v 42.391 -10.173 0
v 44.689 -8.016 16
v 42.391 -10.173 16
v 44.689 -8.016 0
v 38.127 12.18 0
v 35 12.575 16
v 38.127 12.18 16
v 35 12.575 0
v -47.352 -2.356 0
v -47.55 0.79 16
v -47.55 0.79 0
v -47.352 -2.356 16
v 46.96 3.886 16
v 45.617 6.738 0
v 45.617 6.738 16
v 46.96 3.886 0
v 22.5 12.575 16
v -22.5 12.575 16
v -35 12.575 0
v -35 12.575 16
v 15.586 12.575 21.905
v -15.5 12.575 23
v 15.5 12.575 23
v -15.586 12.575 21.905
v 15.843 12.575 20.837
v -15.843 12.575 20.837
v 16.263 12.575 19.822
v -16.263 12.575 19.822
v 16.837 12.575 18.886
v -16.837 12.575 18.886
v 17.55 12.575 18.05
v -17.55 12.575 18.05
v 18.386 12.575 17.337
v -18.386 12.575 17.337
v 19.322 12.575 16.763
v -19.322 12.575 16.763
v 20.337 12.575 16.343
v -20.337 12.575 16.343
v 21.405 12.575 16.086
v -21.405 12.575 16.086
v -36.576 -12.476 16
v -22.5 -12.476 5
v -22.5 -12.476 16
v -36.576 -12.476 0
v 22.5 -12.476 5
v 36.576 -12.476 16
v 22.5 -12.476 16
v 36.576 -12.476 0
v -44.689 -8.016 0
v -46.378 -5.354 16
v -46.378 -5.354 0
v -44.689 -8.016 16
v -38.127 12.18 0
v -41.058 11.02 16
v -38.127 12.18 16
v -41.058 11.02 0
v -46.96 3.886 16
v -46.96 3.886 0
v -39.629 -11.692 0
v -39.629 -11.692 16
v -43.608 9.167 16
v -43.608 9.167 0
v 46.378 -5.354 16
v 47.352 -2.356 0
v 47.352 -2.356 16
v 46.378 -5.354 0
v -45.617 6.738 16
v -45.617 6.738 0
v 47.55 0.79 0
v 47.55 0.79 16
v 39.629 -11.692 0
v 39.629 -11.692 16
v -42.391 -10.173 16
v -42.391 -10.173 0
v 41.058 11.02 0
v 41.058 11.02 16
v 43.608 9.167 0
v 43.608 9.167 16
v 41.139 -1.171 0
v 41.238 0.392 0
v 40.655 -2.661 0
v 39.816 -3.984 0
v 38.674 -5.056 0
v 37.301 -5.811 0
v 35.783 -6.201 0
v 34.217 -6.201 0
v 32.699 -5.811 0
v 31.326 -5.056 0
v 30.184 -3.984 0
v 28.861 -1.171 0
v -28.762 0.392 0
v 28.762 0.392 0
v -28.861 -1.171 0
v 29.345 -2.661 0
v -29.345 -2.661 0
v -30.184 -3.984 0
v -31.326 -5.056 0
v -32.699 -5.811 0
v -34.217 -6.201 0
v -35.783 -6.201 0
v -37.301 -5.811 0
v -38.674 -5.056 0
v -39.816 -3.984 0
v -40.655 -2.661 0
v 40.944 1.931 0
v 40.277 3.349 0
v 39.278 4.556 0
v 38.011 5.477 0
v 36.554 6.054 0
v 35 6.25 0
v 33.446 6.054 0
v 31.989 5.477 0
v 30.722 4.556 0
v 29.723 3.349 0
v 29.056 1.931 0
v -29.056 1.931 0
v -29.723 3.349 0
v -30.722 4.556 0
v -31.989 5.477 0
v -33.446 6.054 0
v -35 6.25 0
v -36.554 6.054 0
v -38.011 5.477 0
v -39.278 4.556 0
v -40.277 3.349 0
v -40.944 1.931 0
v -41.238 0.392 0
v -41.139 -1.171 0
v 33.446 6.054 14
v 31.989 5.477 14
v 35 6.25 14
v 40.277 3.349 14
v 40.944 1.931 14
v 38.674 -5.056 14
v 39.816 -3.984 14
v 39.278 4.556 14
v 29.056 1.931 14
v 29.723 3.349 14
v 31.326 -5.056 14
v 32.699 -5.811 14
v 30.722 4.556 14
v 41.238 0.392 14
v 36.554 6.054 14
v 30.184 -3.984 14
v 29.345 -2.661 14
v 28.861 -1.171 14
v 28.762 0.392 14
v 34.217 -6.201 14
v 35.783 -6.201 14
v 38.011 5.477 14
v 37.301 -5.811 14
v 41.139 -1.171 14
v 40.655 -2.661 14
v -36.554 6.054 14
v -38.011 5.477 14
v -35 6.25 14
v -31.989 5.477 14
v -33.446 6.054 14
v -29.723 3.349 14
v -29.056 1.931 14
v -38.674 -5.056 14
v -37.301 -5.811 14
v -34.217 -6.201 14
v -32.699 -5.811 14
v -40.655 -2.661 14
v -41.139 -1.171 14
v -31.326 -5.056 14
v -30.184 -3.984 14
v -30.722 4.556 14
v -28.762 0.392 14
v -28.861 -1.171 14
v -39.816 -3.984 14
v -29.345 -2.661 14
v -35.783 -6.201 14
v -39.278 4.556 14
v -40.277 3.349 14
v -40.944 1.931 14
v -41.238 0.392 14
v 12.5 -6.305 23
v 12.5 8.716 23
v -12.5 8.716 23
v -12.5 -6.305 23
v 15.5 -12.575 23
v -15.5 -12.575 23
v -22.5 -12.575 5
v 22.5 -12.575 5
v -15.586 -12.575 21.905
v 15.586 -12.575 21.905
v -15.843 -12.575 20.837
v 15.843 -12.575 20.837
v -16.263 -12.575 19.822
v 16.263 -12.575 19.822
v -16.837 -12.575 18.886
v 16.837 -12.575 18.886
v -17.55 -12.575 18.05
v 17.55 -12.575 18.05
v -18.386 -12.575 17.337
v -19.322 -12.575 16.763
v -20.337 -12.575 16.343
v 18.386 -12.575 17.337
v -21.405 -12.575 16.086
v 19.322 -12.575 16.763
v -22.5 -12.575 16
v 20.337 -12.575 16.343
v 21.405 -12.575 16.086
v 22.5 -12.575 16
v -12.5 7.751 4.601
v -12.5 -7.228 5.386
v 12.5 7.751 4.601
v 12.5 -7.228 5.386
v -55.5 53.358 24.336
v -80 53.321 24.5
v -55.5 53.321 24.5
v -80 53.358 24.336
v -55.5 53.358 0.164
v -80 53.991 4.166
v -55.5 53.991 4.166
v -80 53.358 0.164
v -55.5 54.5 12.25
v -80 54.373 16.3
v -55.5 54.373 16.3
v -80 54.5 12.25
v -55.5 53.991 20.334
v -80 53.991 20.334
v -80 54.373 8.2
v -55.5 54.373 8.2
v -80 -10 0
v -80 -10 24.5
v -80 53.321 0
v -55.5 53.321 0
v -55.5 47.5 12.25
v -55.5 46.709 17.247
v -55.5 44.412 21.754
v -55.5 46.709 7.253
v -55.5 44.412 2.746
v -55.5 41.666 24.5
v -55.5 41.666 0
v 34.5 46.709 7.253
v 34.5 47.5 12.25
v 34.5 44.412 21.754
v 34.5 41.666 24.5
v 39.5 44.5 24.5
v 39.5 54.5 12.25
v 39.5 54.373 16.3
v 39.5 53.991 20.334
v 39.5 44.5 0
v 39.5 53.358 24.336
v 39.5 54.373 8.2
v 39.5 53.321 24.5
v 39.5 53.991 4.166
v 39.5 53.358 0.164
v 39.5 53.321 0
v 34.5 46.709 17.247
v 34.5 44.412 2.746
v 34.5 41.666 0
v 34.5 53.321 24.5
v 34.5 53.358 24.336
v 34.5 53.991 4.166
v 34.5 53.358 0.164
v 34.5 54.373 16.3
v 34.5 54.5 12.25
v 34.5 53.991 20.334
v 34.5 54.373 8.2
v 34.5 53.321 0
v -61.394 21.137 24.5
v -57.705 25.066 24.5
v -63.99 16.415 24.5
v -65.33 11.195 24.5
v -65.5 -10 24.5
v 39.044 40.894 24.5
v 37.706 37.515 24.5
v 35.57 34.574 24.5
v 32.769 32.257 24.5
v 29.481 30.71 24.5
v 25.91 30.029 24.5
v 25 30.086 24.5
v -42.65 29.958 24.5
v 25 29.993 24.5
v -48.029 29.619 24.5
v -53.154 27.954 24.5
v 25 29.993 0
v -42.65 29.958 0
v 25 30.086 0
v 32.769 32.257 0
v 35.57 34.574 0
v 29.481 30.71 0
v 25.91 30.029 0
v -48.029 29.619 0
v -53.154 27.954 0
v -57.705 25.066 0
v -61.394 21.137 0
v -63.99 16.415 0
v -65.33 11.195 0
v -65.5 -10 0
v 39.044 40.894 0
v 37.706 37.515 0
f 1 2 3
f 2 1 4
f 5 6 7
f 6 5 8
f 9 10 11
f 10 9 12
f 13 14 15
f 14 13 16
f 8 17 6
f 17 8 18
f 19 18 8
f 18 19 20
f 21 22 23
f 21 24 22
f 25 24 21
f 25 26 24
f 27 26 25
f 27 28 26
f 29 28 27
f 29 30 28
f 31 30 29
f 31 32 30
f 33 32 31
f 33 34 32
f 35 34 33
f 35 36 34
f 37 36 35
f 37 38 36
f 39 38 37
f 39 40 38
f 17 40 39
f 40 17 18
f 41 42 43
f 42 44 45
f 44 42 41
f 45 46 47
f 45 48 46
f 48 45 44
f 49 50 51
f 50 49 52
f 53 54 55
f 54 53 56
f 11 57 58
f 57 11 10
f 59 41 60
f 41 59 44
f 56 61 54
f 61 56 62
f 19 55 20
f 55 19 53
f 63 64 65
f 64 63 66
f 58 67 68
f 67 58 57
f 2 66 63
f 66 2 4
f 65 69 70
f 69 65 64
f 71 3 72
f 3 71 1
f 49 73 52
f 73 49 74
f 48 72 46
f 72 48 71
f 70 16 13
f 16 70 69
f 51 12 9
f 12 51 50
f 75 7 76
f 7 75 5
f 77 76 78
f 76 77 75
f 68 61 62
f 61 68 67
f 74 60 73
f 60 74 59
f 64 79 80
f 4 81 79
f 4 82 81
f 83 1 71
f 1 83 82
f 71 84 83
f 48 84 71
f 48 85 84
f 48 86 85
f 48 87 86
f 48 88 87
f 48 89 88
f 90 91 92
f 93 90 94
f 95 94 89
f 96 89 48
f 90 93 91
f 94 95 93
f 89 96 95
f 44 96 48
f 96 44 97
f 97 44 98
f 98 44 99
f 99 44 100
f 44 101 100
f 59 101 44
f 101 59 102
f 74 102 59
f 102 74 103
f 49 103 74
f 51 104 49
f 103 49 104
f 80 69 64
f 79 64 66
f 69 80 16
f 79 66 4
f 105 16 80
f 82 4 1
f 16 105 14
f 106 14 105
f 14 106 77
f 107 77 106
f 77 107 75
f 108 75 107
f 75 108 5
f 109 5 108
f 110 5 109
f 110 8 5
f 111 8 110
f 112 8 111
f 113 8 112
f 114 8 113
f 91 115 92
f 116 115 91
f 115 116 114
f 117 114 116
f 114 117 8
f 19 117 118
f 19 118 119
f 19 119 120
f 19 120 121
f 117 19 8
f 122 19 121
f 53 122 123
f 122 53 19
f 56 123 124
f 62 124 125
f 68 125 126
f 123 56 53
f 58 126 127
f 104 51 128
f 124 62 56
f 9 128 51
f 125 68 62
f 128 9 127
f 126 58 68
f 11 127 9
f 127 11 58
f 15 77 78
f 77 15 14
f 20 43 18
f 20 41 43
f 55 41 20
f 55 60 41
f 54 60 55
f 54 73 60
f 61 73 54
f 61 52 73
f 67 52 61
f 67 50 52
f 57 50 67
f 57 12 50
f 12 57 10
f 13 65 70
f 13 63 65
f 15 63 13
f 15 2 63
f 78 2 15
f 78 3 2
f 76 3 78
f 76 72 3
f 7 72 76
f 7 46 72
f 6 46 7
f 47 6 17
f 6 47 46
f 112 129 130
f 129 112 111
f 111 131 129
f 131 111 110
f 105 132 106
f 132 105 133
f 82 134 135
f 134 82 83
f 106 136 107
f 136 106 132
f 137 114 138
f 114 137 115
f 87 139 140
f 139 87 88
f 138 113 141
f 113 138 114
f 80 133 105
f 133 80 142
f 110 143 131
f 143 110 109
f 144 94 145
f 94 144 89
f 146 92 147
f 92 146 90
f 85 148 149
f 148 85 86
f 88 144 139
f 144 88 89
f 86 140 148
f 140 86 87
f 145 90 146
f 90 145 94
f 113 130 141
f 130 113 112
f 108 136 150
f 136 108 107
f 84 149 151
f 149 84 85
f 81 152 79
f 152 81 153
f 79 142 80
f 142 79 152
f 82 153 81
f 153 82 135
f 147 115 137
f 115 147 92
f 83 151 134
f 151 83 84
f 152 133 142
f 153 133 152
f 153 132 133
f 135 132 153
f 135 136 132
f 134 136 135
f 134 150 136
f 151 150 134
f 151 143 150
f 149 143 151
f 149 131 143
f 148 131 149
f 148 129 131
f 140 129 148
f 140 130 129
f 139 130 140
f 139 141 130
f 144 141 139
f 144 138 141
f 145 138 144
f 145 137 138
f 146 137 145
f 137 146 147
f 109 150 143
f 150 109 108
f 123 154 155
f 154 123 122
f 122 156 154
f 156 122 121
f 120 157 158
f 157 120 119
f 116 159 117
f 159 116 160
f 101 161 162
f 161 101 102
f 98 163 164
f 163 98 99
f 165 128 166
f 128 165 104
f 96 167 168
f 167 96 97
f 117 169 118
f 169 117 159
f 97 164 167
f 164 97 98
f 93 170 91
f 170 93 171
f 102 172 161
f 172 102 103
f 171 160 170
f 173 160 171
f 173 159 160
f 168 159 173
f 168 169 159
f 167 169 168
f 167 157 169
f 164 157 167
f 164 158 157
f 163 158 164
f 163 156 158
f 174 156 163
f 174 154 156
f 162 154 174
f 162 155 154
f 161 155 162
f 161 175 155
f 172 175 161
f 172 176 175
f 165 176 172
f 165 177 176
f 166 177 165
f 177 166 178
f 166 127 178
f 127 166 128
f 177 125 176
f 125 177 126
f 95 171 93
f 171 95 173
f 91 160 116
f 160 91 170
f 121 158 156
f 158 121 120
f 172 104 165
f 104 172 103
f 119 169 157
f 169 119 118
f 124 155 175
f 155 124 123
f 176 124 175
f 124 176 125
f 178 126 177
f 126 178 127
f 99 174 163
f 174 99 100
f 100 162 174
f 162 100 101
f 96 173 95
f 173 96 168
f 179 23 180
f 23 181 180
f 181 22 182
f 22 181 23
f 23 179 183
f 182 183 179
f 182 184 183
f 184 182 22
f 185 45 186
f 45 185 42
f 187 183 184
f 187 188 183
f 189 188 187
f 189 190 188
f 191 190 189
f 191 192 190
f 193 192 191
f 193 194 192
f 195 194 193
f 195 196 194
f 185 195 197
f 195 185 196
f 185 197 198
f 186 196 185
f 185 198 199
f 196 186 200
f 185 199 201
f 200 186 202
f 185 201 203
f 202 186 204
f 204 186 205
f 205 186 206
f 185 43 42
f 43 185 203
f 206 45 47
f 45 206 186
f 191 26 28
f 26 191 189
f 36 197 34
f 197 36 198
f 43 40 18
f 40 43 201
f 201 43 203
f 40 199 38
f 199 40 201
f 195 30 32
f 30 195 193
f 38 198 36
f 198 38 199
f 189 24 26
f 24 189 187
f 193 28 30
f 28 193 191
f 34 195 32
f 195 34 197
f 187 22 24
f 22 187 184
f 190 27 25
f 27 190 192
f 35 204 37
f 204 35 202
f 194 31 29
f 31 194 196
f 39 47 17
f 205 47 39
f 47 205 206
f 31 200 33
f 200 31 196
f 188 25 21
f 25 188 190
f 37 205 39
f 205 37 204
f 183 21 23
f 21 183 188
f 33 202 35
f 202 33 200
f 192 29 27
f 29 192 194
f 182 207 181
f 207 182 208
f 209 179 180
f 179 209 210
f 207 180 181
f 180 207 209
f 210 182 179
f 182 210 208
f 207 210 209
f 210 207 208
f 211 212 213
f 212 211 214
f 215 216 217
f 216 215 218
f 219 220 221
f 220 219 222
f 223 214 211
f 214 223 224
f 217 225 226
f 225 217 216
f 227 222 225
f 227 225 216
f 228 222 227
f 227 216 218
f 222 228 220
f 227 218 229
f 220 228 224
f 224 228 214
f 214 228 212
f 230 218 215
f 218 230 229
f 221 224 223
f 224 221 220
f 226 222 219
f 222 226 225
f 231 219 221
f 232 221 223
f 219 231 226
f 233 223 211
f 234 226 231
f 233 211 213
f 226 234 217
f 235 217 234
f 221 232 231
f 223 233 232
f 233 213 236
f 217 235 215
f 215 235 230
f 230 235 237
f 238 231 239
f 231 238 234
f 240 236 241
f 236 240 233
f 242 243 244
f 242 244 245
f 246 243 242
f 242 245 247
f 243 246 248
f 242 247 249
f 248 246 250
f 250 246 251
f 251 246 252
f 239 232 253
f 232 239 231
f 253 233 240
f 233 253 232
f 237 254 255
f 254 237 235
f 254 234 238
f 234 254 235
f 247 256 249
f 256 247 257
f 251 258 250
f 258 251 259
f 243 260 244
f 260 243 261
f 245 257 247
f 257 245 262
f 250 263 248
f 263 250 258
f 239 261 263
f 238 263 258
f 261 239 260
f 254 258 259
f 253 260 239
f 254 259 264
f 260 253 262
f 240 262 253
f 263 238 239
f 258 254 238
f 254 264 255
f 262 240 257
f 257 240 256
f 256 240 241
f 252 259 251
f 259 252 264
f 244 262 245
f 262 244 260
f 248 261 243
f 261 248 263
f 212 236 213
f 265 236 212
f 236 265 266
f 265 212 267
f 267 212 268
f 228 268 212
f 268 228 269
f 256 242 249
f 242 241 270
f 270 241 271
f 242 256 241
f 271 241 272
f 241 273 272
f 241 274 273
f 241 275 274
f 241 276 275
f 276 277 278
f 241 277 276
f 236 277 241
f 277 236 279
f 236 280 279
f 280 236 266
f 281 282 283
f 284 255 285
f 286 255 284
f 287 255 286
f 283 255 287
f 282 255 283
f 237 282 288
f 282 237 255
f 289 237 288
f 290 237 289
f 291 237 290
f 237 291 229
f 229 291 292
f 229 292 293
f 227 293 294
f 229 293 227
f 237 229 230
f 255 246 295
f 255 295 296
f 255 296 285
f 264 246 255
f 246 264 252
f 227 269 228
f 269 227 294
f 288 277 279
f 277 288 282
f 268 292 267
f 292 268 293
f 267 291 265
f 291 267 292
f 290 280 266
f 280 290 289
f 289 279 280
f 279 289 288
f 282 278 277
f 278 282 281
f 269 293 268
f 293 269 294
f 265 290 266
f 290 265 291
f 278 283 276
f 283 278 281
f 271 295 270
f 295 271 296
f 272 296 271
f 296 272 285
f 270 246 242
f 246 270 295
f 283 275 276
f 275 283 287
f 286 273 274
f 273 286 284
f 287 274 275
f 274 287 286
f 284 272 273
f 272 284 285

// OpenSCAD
$fn = 25;

// Radius of Z-rods (adjust fit here)
R=6.25;

// Path width of single trace of plastic
w1=.4;

// Distance between Z-rods (center to center)
rods = 70;

//fit of 2 pieces
clearance = .5;

hole_x = 15;
hole_y = 25;
base_cap = 16;
arm_length = 90;
arm_height = 40;
arm_offset = 10;
lip_x = 5;
lip_y = 7;
hole_rim = 3;
slant = 3;
floor = 5;
rise = 7;

module tcube(x, y, z, tx = 0, ty = 0, tz = 0) {
	translate([tx, ty, tz]) {
		cube([x, y, z]);
	}
}

module tcyl(r, h, tx = 0, ty = 0, tz = 0, center = false, $fn = $fn) {
	translate([tx, ty, tz]) {
		cylinder(r = r, h = h, center = center, $fn = $fn);
	}
}

module ccube(x, y, z, ty = 0, tz = 0) {
	tcube(x, y, z, -x / 2, ty, tz);
}

module spool_holder(piece = "all") {

	center_r = R;
	h = base_cap;
	wall = w1 * 4;
	xr = center_r / 4;
	xbc = center_r + wall + xr;
	outer_r = xbc + xr + wall;

	module rodtop(xtz) {
	
		tcyl(center_r, h - 1, tz = -1);

	}

	module span() {
		difference() {
			hull() {
				tcyl(outer_r, h);
				tcyl(outer_r, h, ty = rods);
			}

			rodtop();

			translate([0, rods, 0]) {
				rodtop();
			}
		}
	}

	module arm() {
		thickness = hole_y - clearance;
		bar = hole_x - clearance;
		spindle_length = bar + arm_length + arm_offset + lip_x;
		spindle_depth = thickness;
		height = arm_height + spindle_depth;
		brace_r = bar + lip_y;
		t2 = thickness + 2;

		module L() {
			difference() {
				tcube(spindle_length, height, thickness);

				hull() {
					tcube(1, 1, t2, spindle_length, height - spindle_depth - 1, -1);
					tcube(1, 1, t2, spindle_length, -1, -1);
					tcube(1, 1, t2, bar, -1, -1);
					tcyl(brace_r, t2, bar + brace_r, height - spindle_depth - brace_r, -1);
				}

				tcube(bar + 1, bar + 1, t2, spindle_length - bar, height - spindle_depth - 1, -1);
			}
			tcyl(bar, thickness, spindle_length - bar, height - spindle_depth + bar);
		}

		module ring() {
			lip_r = height;
			spindle_r = thickness * .66;
			$fn = 100;
			ty = height - spindle_r - lip_y;

			tcyl(lip_r, bar + arm_offset, $fn = $fn);
			tcyl(spindle_r, spindle_length, ty = ty, $fn = 20);
			ccube(2 * spindle_r, ty, spindle_length );
			tcyl(lip_r, lip_x, tz = spindle_length - lip_x, $fn = $fn);
		}

		intersection() {
	
			translate([0, 0, thickness / 2]) {
				rotate([0, 90, 0]) {
					ring();
				}
			}

			L();
		}

	}

	module base() {
		w = 2 * outer_r;
		yy = hole_y + 2 * rise;

		module fillet(ty = 0) {
			translate([0, ty, rise + h]) {
				rotate([0, 90, 0]) {
					cylinder(r = rise, h = w + 2, center = true, $fn = 40);
				}
			}
		}

		difference() {
			union() {
				translate([0, -rods / 2, 0]) {
					span();
				}
				difference() {
					ccube(w, yy + 2 * hole_rim, h - floor + rise, -yy / 2 - hole_rim, floor);
					fillet(yy / 2 + hole_rim);
					fillet(-yy / 2 - hole_rim);
				}
			}
			rotate([0, slant, 0]) {
				ccube(hole_x, hole_y, h + rise + 1, -hole_y / 2, floor);
			}
		}

	}

	if (piece == "all") {
		rotate([0, 0, 90]) {
			base();
		}

		translate([-80, -10, 0]) {
			arm();
		}
	}

	if (piece == "arm") {
		arm();
	}

	if (piece == "base") {
		base();
	}

}

spool_holder();
